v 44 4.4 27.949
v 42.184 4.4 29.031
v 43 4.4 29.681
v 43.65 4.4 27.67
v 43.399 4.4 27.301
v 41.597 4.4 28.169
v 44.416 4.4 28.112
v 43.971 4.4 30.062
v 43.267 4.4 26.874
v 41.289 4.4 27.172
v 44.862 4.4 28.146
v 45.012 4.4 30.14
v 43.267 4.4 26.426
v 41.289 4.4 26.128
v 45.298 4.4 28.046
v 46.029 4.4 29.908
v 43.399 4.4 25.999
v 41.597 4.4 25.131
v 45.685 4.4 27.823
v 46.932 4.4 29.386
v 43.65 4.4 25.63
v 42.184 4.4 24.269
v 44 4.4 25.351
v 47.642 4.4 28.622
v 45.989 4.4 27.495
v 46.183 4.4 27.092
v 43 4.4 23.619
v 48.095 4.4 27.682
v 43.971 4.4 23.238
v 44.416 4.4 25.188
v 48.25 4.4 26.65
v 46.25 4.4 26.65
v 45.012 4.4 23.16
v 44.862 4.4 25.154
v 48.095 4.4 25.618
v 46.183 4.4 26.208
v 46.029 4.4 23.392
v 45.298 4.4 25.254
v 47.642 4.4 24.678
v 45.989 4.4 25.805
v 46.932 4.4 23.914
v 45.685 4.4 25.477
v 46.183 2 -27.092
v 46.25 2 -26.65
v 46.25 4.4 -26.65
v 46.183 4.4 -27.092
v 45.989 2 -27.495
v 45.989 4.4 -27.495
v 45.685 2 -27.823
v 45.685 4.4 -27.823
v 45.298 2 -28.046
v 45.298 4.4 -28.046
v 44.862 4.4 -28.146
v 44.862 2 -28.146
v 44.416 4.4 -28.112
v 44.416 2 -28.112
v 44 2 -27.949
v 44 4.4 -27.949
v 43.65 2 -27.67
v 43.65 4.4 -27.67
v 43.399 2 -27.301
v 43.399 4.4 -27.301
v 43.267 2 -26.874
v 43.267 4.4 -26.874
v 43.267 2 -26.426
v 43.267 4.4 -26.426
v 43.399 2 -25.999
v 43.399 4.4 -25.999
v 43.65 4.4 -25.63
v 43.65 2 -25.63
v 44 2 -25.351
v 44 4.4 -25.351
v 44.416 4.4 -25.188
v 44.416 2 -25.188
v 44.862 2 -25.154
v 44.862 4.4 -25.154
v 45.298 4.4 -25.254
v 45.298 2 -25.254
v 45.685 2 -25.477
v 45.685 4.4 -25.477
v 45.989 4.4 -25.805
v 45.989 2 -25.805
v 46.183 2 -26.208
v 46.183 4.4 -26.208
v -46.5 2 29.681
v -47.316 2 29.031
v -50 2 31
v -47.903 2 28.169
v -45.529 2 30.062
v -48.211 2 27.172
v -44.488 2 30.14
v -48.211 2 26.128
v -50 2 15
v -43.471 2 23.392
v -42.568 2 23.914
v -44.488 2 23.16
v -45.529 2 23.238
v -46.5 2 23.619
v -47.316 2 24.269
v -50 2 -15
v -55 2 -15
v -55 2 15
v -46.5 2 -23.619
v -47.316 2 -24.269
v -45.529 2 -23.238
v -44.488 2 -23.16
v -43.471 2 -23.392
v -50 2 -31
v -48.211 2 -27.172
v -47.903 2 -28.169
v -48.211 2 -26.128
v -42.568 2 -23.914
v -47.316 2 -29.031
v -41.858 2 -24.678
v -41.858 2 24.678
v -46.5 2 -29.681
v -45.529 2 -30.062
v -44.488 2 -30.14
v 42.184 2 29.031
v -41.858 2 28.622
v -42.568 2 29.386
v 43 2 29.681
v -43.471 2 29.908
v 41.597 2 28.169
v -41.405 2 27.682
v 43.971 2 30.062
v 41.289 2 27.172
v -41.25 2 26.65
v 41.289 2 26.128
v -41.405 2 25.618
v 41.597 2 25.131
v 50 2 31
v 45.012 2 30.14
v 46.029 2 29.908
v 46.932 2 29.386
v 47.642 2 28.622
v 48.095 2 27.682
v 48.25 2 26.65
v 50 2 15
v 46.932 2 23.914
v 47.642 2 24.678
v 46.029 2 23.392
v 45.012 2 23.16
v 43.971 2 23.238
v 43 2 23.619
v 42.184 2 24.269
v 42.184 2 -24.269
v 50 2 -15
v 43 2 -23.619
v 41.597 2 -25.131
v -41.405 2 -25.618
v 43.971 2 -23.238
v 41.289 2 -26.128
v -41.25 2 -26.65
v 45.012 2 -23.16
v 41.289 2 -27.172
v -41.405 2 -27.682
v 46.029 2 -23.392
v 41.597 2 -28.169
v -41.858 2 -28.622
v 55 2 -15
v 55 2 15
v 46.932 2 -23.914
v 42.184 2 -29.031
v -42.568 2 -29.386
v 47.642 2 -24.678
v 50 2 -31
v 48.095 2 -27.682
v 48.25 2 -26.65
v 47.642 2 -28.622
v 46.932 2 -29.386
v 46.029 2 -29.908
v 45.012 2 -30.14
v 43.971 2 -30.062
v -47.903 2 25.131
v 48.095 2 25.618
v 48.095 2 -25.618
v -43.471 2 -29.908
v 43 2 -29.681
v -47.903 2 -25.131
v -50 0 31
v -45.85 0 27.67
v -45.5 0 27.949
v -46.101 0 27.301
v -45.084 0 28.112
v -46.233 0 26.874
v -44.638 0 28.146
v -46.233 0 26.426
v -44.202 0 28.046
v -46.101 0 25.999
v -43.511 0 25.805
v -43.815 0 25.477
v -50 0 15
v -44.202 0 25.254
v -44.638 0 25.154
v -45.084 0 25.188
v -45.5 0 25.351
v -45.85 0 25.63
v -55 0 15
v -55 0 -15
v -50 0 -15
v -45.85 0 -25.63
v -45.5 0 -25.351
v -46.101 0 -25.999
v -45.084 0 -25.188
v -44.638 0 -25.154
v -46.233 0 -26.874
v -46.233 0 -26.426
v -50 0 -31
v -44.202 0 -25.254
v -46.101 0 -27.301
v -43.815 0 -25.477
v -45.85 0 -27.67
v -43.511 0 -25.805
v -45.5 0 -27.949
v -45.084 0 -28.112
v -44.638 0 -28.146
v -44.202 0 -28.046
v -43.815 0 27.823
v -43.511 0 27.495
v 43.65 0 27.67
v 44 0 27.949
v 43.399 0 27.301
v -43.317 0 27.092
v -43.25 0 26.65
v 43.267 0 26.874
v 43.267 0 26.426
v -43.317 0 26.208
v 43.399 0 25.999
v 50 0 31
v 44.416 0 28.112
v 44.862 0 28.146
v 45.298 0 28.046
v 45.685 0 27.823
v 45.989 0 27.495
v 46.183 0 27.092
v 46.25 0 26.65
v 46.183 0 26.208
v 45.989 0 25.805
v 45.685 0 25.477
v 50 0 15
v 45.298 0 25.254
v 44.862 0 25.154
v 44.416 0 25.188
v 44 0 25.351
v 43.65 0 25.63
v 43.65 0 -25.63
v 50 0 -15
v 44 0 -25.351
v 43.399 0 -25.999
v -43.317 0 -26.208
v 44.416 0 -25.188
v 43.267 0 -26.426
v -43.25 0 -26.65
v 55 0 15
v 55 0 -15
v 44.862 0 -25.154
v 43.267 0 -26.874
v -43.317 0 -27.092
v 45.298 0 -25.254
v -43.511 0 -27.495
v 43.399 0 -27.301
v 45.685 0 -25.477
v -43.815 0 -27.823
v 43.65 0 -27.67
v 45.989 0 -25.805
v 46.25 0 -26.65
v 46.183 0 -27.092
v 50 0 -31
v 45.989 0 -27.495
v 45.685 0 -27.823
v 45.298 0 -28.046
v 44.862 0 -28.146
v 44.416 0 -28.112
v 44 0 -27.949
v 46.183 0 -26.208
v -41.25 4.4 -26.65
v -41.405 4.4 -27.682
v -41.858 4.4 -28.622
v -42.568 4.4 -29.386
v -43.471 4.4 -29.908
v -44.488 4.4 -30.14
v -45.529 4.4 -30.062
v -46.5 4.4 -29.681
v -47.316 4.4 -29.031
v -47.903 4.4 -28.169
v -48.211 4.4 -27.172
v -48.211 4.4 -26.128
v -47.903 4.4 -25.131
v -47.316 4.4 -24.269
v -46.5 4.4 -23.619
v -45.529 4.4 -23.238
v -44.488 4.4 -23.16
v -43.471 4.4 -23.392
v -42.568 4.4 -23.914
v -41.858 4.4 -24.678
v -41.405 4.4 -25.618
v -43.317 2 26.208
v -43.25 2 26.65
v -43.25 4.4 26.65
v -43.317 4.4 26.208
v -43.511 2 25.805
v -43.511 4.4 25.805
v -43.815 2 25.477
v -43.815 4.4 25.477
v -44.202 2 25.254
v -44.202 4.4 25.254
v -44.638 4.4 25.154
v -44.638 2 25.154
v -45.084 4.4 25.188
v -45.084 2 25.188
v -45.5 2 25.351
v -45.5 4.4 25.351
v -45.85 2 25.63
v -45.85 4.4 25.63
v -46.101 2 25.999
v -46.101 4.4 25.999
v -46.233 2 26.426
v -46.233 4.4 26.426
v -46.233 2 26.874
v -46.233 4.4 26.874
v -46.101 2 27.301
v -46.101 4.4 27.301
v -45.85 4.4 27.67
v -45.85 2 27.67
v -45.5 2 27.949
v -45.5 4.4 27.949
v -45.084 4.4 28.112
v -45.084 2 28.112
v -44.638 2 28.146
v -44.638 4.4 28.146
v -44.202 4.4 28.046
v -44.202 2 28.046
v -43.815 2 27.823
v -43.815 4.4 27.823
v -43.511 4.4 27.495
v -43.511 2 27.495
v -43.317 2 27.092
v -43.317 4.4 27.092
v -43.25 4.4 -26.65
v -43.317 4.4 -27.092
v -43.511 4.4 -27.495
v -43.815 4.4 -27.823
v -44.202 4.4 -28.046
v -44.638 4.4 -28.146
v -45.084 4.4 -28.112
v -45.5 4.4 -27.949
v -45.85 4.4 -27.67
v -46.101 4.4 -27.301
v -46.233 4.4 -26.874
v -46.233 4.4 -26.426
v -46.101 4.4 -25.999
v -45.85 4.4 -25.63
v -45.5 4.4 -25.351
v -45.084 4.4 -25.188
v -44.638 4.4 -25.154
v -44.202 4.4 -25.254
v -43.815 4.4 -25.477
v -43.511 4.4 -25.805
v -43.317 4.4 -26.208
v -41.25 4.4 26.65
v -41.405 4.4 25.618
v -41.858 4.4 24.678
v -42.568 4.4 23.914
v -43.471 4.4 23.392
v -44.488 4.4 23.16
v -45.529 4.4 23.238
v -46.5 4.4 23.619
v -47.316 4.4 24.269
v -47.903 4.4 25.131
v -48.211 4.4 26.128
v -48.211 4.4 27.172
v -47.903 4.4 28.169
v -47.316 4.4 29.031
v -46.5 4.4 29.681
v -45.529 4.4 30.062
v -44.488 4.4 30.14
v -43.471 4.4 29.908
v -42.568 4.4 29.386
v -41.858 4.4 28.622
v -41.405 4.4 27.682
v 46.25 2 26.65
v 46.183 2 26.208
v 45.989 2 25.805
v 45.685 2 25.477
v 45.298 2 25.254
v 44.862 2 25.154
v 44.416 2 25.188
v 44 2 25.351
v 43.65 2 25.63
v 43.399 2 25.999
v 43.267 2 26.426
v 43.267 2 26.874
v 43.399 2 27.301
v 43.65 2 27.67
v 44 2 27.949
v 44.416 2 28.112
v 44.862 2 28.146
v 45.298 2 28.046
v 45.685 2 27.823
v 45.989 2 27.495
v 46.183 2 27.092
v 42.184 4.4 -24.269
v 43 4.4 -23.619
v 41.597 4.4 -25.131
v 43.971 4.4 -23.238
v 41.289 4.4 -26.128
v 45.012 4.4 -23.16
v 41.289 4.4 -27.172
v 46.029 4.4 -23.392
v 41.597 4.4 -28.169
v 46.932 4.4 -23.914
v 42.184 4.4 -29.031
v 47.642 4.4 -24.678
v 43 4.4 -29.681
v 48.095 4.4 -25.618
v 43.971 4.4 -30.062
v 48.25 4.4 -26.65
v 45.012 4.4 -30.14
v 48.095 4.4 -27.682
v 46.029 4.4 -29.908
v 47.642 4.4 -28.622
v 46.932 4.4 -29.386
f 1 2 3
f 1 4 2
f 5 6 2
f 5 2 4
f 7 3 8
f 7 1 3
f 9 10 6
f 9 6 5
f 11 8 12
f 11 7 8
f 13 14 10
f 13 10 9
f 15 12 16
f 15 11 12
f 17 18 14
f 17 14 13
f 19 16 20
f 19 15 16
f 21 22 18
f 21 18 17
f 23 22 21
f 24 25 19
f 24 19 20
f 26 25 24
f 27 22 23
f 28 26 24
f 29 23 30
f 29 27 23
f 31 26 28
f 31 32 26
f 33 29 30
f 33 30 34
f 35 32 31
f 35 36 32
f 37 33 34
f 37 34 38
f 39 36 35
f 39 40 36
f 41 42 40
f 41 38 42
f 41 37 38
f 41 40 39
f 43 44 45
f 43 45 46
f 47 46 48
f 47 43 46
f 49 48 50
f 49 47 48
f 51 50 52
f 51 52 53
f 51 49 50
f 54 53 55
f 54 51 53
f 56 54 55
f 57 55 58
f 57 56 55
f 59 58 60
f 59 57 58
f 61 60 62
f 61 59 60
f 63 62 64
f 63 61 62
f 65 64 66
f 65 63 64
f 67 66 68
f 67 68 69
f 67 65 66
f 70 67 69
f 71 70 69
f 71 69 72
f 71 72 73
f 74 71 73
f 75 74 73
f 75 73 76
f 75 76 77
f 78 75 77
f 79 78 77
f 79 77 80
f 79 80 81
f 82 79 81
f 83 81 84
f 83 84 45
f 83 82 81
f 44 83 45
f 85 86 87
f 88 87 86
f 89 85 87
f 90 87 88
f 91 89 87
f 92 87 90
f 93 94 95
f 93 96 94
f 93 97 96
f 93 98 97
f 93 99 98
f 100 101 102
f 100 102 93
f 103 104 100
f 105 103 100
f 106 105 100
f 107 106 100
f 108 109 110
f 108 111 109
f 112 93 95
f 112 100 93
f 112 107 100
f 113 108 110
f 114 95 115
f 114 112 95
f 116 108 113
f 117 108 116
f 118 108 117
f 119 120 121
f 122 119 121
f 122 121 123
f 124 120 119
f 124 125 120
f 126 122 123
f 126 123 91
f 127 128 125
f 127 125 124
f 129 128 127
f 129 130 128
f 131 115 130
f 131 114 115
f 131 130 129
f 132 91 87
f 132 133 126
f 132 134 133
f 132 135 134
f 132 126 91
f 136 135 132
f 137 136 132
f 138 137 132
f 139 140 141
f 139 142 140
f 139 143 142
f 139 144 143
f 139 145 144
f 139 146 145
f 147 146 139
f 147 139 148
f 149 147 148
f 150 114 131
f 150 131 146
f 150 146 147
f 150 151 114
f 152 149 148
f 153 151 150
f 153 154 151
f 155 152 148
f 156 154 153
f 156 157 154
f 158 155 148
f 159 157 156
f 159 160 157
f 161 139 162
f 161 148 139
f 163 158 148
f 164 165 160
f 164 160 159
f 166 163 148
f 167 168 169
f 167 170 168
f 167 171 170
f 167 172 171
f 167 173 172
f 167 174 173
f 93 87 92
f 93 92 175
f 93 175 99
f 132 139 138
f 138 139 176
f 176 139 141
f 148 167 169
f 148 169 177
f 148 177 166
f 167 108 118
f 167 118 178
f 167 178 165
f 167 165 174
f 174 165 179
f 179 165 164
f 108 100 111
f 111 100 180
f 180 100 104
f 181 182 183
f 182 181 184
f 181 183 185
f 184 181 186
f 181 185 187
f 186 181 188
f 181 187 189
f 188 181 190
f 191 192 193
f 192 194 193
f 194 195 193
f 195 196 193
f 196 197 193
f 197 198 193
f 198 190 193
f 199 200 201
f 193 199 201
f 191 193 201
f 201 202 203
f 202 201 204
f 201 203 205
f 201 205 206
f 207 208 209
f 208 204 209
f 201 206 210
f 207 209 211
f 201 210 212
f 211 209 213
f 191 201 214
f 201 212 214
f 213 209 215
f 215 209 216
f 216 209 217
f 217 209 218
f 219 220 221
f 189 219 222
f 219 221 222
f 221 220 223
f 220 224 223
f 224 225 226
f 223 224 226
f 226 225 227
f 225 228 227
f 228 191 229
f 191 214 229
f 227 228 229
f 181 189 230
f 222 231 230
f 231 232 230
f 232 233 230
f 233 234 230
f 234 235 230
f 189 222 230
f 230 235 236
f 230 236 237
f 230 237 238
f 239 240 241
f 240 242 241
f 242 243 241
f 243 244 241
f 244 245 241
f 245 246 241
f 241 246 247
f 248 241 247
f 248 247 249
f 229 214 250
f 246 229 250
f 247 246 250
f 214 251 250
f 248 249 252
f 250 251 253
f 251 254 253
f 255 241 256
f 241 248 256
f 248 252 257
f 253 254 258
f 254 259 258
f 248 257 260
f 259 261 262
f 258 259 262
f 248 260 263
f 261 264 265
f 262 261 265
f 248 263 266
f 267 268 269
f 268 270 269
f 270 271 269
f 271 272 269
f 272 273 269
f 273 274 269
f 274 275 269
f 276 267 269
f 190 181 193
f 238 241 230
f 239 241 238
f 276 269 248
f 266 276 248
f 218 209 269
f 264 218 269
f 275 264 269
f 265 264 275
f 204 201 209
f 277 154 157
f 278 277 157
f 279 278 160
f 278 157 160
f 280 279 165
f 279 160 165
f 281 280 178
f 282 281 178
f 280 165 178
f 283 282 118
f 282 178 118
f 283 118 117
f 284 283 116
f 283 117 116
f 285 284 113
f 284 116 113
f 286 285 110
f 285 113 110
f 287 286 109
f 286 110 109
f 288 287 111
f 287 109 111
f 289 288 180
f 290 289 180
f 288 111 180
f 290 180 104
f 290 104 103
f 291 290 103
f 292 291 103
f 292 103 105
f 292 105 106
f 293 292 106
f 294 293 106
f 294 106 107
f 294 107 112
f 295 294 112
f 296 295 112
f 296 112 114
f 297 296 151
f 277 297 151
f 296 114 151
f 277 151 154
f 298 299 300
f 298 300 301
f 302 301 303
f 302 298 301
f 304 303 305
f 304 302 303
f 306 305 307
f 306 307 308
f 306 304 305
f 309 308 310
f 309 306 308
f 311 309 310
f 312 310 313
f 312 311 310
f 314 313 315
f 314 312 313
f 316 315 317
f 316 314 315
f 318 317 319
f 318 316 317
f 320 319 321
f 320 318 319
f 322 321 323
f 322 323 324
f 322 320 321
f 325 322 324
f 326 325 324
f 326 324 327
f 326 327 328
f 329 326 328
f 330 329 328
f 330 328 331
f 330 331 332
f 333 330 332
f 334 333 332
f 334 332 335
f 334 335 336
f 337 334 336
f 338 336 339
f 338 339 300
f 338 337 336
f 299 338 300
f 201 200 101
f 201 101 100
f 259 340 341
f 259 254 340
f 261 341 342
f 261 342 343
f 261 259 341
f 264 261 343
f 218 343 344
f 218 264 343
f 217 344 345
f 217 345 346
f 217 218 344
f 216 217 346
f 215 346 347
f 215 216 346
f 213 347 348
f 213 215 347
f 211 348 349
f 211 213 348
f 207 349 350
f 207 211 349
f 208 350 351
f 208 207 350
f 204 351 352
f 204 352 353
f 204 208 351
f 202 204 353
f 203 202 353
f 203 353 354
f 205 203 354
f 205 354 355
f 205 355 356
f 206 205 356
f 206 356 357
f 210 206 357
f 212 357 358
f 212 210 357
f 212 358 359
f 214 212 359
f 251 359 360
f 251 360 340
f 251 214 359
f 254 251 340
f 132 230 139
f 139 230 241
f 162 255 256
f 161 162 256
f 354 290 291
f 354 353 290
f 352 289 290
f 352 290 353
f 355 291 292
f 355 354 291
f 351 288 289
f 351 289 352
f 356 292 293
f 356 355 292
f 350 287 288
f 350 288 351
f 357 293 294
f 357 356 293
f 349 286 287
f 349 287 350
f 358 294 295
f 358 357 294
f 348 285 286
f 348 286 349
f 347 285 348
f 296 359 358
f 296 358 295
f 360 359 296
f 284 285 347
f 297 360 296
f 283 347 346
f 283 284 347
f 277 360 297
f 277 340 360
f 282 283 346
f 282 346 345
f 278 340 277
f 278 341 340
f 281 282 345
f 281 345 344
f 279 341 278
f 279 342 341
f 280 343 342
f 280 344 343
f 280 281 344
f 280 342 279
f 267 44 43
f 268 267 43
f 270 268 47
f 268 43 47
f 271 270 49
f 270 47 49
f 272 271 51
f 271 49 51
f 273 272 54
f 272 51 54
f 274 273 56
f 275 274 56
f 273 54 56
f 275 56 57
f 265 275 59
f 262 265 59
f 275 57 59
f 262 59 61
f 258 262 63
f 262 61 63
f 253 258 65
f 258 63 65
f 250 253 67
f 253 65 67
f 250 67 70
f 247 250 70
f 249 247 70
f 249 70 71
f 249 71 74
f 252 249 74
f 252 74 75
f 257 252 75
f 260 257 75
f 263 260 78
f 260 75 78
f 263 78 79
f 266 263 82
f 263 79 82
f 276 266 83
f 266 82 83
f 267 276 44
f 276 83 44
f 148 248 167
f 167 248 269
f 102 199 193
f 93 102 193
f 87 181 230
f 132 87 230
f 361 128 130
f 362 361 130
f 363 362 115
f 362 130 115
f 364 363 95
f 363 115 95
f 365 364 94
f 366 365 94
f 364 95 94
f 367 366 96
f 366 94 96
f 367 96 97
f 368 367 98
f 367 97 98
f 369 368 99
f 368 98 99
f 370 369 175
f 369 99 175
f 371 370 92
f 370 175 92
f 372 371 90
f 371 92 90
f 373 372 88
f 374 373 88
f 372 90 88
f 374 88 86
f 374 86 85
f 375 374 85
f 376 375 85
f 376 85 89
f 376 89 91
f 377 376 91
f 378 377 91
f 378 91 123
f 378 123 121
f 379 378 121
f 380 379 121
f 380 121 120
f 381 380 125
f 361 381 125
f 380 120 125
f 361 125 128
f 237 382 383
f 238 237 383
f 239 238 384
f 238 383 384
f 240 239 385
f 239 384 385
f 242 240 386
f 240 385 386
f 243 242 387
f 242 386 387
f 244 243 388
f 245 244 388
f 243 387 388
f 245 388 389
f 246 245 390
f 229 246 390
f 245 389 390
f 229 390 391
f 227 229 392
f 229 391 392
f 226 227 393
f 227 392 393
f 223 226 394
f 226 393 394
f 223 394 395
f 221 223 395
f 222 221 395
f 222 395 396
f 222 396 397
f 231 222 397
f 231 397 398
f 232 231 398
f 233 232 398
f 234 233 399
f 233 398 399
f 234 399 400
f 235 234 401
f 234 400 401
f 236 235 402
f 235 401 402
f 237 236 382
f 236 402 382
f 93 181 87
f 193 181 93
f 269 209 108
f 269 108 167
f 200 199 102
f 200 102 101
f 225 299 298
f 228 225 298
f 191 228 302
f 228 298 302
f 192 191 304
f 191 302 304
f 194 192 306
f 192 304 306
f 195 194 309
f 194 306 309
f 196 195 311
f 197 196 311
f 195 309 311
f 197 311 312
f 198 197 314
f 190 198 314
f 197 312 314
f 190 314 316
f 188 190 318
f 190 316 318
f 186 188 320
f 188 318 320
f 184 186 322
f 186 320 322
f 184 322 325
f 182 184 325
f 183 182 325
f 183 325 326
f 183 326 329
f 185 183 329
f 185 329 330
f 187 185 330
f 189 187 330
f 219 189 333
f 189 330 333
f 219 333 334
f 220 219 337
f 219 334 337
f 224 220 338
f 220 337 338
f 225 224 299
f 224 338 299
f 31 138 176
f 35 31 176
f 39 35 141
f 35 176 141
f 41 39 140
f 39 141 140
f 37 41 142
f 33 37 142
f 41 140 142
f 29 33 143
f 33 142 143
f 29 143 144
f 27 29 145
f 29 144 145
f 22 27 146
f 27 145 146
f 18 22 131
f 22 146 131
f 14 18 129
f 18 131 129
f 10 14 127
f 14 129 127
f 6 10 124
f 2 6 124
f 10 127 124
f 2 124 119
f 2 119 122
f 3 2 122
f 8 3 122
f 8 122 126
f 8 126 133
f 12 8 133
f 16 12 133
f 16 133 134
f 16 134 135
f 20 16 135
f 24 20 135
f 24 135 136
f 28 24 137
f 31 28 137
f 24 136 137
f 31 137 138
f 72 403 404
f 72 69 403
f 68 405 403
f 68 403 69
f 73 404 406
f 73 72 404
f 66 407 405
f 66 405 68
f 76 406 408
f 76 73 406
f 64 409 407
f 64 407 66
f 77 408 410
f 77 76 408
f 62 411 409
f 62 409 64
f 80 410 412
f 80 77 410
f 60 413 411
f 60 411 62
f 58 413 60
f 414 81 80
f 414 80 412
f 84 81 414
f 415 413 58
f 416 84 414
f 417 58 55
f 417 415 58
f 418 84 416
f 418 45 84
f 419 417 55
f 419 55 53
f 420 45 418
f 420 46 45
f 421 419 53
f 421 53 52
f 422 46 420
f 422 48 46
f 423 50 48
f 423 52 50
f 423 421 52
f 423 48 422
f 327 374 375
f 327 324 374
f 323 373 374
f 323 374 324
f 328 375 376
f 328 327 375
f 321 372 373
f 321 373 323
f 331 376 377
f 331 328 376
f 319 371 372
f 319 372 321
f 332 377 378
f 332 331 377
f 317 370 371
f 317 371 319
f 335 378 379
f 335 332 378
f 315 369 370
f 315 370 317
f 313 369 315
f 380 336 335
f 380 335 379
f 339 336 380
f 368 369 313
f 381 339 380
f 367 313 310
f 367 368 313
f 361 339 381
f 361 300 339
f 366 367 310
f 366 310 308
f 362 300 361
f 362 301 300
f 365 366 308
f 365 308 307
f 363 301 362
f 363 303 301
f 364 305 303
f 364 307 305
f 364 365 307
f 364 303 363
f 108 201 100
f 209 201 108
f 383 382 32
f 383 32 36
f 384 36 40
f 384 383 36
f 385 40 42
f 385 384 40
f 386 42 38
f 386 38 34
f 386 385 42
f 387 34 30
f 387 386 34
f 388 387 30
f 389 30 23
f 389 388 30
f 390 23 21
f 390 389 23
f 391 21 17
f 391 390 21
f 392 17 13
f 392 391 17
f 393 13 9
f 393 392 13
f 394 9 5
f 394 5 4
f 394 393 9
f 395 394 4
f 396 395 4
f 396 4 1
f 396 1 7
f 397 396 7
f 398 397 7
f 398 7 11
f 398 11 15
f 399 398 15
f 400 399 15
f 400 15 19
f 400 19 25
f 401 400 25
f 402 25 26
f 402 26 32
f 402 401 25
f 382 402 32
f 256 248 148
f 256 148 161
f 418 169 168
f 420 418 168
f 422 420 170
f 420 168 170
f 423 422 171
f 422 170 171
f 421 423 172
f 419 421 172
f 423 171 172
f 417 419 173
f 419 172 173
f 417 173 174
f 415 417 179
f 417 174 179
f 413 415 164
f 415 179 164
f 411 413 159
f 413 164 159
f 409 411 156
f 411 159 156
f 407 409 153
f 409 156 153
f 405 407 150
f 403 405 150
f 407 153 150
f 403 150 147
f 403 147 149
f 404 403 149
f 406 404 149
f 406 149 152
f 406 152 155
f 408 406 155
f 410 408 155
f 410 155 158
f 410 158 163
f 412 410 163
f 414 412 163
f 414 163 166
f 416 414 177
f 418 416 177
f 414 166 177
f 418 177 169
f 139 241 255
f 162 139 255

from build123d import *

# Parameters (mm, degrees)
SKETCH_1_W            = 100
SKETCH_1_H            = 62
SKETCH_1_W_2          = 110
SKETCH_1_H_2          = 30
EXTRUDE_466_DEPTH     = 2
SKETCH_2_R            = 1.5
CUT_EXTRUDE_826_DEPTH = 2
SKETCH_3_R            = 3.5
SKETCH_3_R_2          = 1.5
EXTRUDE_1142_DEPTH    = 2.4


with BuildPart() as part:
    # 草图1 → Extrude 466 (new body)
    with BuildSketch(Plane(origin=(0, 0, 0), x_dir=(1, 0, 0), z_dir=(0, 1, 0))):
        Rectangle(SKETCH_1_W, SKETCH_1_H)
        Rectangle(SKETCH_1_W_2, SKETCH_1_H_2)
    extrude(amount=EXTRUDE_466_DEPTH)

    # 草图2 → Cut-Extrude 826 (cut)
    with BuildSketch(Plane(origin=(0, 2, 0), x_dir=(1, 0, 0), z_dir=(0, 1, 0))):
        with Locations((-44.75, 26.65)):
            Circle(SKETCH_2_R)
        with Locations((44.75, 26.65)):
            Circle(SKETCH_2_R)
        with Locations((-44.75, -26.65)):
            Circle(SKETCH_2_R)
        with Locations((44.75, -26.65)):
            Circle(SKETCH_2_R)
    extrude(amount=-CUT_EXTRUDE_826_DEPTH, mode=Mode.SUBTRACT)

    # 草图3 → Extrude 1142 (add)
    with BuildSketch(Plane(origin=(0, 2, 0), x_dir=(1, 0, 0), z_dir=(0, 1, 0))):
        with Locations((-44.75, 26.65)):
            Circle(SKETCH_3_R)
        with Locations((-44.75, 26.65)):
            Circle(SKETCH_3_R_2, mode=Mode.SUBTRACT)
        with Locations((44.75, 26.65)):
            Circle(SKETCH_3_R)
        with Locations((44.75, 26.65)):
            Circle(SKETCH_3_R_2, mode=Mode.SUBTRACT)
        with Locations((-44.75, -26.65)):
            Circle(SKETCH_3_R)
        with Locations((-44.75, -26.65)):
            Circle(SKETCH_3_R_2, mode=Mode.SUBTRACT)
        with Locations((44.75, -26.65)):
            Circle(SKETCH_3_R)
        with Locations((44.75, -26.65)):
            Circle(SKETCH_3_R_2, mode=Mode.SUBTRACT)
    extrude(amount=EXTRUDE_1142_DEPTH)


solid = part.part
